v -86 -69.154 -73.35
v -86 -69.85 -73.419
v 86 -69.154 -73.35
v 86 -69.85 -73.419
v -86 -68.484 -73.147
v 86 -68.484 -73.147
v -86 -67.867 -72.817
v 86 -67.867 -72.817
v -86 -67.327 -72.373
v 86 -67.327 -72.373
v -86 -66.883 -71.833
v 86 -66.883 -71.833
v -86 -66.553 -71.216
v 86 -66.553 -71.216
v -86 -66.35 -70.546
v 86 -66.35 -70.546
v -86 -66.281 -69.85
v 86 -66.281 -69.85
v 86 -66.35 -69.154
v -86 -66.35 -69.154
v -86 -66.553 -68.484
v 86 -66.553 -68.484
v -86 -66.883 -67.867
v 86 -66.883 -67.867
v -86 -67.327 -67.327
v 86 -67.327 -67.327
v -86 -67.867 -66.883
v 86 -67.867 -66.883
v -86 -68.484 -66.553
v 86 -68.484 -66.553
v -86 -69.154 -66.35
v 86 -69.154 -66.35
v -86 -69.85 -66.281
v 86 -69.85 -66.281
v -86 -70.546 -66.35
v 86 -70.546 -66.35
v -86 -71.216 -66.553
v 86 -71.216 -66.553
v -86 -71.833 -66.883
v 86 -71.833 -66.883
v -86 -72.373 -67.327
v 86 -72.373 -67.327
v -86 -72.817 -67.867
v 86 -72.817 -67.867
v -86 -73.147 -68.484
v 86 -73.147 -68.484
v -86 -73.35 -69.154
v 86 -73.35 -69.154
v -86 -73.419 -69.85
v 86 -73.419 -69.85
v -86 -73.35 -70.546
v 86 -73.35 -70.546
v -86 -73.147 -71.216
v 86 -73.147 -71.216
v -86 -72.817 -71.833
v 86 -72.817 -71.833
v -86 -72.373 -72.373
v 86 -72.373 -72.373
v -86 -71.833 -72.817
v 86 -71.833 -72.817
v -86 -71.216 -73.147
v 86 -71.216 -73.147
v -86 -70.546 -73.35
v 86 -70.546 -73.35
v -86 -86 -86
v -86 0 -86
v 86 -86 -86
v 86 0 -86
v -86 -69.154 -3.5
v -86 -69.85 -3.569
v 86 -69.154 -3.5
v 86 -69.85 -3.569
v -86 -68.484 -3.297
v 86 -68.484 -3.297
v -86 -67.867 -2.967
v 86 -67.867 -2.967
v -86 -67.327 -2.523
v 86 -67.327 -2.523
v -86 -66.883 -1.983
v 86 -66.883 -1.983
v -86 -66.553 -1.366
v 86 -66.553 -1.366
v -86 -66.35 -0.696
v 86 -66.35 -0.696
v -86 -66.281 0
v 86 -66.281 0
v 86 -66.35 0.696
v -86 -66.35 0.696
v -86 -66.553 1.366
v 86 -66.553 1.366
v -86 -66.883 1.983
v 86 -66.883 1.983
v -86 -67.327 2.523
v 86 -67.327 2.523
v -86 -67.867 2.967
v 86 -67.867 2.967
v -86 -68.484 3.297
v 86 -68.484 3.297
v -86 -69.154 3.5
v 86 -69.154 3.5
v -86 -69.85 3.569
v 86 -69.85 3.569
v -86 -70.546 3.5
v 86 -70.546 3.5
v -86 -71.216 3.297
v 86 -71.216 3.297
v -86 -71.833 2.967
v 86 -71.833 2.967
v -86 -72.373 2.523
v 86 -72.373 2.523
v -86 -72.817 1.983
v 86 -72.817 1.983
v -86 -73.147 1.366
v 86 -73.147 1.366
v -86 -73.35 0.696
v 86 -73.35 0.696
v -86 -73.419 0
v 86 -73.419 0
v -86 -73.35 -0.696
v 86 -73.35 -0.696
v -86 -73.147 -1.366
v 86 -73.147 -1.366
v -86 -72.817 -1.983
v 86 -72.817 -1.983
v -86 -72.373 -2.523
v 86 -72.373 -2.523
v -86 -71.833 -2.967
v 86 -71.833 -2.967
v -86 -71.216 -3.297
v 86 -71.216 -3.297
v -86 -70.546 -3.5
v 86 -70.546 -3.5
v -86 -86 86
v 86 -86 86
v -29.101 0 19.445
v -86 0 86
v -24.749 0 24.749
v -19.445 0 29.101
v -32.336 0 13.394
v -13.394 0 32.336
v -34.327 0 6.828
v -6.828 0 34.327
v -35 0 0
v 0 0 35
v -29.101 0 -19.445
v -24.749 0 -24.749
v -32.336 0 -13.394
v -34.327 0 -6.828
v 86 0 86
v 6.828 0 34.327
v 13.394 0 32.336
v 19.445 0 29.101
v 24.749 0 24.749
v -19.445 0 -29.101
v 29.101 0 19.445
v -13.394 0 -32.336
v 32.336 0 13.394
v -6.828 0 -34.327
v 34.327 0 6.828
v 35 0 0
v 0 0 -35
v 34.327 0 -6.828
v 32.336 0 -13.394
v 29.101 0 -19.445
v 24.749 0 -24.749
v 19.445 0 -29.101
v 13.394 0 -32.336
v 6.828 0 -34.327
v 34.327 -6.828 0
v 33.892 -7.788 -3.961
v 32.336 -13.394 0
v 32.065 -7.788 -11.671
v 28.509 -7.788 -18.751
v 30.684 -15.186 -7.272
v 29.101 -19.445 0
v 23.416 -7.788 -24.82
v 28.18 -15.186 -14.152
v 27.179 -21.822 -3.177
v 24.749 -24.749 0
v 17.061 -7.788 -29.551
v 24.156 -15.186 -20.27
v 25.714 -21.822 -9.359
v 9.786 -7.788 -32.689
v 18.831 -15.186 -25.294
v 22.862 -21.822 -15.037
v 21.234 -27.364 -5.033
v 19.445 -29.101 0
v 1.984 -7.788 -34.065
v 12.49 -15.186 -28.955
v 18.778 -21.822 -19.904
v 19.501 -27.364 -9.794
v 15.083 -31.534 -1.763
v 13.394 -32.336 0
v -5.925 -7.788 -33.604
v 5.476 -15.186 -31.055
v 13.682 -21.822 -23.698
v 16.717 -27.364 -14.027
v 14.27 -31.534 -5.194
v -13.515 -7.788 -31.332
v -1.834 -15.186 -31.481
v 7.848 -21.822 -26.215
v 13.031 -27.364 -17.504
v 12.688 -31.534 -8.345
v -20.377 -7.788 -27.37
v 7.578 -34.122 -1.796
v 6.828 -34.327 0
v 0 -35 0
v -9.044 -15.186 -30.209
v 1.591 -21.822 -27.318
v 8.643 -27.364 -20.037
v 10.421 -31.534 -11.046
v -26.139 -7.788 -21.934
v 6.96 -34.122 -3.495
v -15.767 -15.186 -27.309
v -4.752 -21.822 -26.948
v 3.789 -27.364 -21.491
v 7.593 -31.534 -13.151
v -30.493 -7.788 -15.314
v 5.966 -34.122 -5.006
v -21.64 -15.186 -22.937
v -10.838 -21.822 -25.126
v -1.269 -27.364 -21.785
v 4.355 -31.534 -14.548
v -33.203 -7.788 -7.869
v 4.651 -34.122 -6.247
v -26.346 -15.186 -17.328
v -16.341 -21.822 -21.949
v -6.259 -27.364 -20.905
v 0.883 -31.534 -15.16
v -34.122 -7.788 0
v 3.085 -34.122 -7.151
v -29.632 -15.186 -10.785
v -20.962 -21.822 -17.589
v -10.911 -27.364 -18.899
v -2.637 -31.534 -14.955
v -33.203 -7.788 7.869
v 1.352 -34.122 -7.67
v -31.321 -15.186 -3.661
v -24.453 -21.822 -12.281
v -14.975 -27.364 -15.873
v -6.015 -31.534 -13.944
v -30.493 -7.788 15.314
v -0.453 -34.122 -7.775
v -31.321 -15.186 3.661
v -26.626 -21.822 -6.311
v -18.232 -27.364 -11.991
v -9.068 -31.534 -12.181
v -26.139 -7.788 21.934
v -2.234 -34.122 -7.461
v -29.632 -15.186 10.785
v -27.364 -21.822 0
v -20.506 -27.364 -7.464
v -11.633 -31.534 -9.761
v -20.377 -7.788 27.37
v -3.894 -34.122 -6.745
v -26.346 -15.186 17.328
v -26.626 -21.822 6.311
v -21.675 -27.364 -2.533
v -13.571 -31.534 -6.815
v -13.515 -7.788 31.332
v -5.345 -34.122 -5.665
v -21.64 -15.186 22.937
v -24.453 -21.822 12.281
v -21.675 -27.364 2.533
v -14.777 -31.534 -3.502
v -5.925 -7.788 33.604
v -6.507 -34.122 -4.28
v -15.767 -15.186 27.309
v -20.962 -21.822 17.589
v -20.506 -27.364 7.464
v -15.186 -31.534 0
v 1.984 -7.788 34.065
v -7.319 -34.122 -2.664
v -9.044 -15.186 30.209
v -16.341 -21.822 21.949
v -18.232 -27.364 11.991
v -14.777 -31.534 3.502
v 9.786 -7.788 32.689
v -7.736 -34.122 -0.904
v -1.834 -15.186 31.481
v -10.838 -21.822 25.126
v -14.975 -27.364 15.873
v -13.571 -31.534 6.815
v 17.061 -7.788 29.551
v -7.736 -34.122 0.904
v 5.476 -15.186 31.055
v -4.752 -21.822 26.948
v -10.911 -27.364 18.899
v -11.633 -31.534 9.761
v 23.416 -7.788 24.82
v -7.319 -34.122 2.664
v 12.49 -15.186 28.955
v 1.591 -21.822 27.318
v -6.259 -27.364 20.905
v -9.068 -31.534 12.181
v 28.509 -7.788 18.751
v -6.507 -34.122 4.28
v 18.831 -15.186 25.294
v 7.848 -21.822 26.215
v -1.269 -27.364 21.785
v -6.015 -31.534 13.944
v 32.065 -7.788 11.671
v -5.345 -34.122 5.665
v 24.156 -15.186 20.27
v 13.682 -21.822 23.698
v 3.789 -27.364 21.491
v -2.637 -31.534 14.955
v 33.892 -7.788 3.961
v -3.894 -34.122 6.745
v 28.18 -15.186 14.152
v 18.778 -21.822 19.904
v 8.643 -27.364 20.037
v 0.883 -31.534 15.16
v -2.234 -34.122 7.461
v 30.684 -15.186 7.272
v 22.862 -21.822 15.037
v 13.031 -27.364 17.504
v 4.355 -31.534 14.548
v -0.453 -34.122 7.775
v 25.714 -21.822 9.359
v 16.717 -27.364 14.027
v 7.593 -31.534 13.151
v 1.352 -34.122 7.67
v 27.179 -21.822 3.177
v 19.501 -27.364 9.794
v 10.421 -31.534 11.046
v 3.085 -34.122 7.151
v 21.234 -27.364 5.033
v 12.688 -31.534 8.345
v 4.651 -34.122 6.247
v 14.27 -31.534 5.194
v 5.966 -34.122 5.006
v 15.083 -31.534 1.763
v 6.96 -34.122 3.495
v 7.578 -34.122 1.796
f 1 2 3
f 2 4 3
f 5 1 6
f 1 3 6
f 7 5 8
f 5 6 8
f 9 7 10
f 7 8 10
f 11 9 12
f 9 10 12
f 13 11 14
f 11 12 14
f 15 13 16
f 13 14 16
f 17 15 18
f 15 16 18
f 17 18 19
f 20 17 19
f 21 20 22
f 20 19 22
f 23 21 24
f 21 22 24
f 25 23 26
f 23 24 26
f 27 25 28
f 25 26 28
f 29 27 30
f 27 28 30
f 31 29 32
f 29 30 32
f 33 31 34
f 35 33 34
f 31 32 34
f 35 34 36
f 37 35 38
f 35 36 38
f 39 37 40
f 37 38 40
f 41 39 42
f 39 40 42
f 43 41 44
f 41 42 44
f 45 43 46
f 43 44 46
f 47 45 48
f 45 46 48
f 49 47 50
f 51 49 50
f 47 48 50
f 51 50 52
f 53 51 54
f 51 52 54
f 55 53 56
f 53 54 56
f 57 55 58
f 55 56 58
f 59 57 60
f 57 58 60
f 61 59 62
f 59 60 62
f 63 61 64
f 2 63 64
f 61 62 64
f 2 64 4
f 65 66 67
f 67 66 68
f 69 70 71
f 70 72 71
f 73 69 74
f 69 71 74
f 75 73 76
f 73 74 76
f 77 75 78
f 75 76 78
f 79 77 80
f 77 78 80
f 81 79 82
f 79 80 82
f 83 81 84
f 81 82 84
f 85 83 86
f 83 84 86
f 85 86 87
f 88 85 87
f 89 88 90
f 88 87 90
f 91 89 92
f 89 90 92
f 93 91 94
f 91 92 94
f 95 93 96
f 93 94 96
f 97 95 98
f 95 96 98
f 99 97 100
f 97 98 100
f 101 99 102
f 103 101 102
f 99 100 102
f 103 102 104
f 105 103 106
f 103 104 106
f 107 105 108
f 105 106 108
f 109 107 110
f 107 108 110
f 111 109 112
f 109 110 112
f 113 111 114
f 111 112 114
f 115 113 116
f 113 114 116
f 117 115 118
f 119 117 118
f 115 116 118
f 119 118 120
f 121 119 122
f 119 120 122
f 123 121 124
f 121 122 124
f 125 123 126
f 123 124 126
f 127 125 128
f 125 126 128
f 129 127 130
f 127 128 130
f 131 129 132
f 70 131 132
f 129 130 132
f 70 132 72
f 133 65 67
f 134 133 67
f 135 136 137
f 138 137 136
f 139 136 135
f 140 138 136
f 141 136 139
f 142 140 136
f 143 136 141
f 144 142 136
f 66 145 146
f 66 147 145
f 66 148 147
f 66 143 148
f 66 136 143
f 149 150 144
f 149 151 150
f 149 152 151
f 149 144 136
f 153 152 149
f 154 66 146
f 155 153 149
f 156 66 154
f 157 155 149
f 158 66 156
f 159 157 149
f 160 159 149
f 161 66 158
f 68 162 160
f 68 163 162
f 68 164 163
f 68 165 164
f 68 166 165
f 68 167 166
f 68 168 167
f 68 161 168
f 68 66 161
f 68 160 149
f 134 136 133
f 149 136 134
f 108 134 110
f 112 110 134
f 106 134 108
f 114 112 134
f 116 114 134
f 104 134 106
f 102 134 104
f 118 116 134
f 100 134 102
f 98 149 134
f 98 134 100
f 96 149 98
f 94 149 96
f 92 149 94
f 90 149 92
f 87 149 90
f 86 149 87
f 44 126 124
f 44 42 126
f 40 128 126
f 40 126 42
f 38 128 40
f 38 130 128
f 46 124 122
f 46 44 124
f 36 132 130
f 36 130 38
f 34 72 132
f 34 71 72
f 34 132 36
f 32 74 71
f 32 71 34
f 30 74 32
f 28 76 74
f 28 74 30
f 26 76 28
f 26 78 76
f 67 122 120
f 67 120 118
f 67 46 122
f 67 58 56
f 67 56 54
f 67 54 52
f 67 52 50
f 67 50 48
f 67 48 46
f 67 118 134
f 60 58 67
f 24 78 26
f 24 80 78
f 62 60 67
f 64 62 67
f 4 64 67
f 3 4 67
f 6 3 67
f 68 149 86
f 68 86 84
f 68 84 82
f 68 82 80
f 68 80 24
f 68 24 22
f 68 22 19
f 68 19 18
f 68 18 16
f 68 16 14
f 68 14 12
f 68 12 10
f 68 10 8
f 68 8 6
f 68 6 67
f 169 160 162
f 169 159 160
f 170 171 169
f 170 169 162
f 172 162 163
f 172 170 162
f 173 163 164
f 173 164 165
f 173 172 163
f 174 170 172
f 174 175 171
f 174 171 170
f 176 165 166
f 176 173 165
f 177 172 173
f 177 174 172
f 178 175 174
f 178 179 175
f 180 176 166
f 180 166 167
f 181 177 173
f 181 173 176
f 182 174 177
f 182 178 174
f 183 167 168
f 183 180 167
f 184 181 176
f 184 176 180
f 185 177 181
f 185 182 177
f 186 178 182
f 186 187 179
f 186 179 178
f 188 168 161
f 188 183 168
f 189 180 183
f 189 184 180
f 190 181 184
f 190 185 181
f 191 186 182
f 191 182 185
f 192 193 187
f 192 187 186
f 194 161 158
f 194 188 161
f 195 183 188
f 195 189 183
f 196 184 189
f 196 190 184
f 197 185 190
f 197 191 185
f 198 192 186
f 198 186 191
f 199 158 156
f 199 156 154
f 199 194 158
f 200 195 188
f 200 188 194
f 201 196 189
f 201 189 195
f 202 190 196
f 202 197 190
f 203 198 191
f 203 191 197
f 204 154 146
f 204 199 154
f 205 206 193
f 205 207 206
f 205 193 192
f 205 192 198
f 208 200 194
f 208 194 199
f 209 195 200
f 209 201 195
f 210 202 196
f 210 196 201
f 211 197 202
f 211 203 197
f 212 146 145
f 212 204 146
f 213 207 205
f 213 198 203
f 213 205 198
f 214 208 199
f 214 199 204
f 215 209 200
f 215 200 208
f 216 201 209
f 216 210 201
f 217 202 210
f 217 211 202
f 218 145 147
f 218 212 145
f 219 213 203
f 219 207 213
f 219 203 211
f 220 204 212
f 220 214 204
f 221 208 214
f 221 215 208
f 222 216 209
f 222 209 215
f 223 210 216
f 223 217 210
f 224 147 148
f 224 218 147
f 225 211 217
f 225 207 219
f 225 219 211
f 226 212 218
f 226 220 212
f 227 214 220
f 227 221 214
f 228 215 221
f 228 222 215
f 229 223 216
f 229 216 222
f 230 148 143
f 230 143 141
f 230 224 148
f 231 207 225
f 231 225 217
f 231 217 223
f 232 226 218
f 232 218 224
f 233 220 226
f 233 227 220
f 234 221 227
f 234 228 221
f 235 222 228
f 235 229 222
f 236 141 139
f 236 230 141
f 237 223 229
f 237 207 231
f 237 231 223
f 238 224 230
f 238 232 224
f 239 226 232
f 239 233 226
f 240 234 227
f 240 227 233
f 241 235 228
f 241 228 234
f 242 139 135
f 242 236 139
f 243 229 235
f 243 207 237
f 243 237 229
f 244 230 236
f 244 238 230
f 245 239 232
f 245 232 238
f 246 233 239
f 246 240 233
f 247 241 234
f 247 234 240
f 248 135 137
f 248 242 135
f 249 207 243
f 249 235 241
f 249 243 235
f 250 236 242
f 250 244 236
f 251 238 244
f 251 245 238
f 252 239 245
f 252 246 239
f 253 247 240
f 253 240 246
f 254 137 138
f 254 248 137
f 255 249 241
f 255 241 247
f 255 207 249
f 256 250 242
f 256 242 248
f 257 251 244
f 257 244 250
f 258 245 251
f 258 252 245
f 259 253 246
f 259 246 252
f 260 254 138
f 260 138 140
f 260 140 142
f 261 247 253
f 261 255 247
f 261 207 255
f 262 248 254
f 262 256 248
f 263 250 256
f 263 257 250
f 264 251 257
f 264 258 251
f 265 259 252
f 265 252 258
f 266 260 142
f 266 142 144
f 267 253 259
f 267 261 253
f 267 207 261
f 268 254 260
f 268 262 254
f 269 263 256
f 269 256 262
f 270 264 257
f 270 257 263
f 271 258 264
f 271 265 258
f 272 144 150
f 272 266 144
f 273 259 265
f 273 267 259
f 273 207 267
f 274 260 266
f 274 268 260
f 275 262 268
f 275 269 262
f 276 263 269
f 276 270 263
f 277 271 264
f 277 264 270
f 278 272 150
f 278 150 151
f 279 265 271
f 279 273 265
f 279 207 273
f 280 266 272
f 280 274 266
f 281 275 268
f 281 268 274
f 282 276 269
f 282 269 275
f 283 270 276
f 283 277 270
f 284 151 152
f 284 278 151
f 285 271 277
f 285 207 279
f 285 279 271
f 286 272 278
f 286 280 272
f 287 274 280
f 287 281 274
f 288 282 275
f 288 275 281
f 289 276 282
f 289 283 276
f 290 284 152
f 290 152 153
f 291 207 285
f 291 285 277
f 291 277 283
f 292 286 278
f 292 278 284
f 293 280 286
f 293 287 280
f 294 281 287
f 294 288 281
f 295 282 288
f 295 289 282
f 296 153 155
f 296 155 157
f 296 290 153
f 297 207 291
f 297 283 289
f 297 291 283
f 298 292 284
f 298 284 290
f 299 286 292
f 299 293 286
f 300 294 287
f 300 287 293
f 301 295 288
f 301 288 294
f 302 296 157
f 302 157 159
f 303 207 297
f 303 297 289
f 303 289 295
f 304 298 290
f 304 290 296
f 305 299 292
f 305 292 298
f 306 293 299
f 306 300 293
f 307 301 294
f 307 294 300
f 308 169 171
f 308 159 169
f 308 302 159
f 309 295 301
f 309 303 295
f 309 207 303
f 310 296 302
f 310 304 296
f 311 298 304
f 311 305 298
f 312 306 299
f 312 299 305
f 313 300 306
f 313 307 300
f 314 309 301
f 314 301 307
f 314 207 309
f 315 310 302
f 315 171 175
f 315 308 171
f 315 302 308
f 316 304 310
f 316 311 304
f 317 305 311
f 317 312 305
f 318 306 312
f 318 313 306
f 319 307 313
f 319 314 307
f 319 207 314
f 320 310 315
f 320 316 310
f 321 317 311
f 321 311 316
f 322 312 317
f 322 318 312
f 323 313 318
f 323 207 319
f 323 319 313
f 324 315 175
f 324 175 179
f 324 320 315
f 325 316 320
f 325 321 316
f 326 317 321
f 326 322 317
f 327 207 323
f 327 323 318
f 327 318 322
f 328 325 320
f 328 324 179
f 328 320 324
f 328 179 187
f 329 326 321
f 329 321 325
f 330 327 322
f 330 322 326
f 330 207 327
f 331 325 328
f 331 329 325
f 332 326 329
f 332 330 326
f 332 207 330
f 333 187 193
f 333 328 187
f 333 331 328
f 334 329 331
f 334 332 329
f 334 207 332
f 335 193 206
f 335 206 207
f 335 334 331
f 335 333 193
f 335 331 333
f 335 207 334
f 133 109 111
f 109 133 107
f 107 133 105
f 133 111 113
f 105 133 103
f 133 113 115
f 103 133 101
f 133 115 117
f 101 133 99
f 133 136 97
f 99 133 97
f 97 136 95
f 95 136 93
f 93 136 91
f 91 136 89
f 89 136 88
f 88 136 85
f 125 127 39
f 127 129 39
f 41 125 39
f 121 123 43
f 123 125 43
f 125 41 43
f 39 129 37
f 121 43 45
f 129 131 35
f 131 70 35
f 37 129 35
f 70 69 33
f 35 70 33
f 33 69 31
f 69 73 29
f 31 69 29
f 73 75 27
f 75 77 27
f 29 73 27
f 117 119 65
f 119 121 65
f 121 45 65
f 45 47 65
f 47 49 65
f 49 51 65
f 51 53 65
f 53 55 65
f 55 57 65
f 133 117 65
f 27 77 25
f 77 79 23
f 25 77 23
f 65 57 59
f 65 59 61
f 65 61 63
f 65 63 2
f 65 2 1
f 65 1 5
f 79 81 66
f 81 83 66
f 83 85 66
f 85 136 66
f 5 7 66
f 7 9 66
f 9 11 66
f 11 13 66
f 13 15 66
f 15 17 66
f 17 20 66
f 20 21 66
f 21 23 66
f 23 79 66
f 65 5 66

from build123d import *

# Parameters (mm, degrees)
SKETCH1_W               = 172
SKETCH1_H               = 172
BOSS_EXTRUDE1_DEPTH     = 86
SKETCH3_R               = 3.5687
CUT_EXTRUDE1_DEPTH      = 87
CUT_EXTRUDE1_DEPTH_BACK = 87


with BuildPart() as part:
    # Sketch1 → Boss-Extrude1 (new body)
    with BuildSketch(Plane(origin=(0, 0, 0), x_dir=(1, 0, 0), z_dir=(0, 1, 0))):
        Rectangle(SKETCH1_W, SKETCH1_H)
    extrude(amount=-BOSS_EXTRUDE1_DEPTH)

    # Sketch2 → Cut-Revolve1 (revolve, cut)
    with BuildSketch(Plane.XY):
        with BuildLine():
            Line((0, -35), (0, 0))
            Line((0, 0), (35, 0))
            ThreePointArc((35, 0), (24.748737342, -24.748737342), (0, -35))
        make_face()
    revolve(axis=Axis((0, -35, 0), (0, 1, 0)), mode=Mode.SUBTRACT)

    # Sketch3 → Cut-Extrude1 (cut, two sides)
    with BuildSketch(Plane(origin=(0, 0, 0), x_dir=(0, 0, -1), z_dir=(1, 0, 0))) as cut_extrude1_sk:
        with Locations((0, -69.85)):
            Circle(SKETCH3_R)
        with Locations((69.85, -69.85)):
            Circle(SKETCH3_R)
    extrude(amount=CUT_EXTRUDE1_DEPTH, mode=Mode.SUBTRACT)
    extrude(cut_extrude1_sk.sketch, amount=-CUT_EXTRUDE1_DEPTH_BACK, mode=Mode.SUBTRACT)


solid = part.part
